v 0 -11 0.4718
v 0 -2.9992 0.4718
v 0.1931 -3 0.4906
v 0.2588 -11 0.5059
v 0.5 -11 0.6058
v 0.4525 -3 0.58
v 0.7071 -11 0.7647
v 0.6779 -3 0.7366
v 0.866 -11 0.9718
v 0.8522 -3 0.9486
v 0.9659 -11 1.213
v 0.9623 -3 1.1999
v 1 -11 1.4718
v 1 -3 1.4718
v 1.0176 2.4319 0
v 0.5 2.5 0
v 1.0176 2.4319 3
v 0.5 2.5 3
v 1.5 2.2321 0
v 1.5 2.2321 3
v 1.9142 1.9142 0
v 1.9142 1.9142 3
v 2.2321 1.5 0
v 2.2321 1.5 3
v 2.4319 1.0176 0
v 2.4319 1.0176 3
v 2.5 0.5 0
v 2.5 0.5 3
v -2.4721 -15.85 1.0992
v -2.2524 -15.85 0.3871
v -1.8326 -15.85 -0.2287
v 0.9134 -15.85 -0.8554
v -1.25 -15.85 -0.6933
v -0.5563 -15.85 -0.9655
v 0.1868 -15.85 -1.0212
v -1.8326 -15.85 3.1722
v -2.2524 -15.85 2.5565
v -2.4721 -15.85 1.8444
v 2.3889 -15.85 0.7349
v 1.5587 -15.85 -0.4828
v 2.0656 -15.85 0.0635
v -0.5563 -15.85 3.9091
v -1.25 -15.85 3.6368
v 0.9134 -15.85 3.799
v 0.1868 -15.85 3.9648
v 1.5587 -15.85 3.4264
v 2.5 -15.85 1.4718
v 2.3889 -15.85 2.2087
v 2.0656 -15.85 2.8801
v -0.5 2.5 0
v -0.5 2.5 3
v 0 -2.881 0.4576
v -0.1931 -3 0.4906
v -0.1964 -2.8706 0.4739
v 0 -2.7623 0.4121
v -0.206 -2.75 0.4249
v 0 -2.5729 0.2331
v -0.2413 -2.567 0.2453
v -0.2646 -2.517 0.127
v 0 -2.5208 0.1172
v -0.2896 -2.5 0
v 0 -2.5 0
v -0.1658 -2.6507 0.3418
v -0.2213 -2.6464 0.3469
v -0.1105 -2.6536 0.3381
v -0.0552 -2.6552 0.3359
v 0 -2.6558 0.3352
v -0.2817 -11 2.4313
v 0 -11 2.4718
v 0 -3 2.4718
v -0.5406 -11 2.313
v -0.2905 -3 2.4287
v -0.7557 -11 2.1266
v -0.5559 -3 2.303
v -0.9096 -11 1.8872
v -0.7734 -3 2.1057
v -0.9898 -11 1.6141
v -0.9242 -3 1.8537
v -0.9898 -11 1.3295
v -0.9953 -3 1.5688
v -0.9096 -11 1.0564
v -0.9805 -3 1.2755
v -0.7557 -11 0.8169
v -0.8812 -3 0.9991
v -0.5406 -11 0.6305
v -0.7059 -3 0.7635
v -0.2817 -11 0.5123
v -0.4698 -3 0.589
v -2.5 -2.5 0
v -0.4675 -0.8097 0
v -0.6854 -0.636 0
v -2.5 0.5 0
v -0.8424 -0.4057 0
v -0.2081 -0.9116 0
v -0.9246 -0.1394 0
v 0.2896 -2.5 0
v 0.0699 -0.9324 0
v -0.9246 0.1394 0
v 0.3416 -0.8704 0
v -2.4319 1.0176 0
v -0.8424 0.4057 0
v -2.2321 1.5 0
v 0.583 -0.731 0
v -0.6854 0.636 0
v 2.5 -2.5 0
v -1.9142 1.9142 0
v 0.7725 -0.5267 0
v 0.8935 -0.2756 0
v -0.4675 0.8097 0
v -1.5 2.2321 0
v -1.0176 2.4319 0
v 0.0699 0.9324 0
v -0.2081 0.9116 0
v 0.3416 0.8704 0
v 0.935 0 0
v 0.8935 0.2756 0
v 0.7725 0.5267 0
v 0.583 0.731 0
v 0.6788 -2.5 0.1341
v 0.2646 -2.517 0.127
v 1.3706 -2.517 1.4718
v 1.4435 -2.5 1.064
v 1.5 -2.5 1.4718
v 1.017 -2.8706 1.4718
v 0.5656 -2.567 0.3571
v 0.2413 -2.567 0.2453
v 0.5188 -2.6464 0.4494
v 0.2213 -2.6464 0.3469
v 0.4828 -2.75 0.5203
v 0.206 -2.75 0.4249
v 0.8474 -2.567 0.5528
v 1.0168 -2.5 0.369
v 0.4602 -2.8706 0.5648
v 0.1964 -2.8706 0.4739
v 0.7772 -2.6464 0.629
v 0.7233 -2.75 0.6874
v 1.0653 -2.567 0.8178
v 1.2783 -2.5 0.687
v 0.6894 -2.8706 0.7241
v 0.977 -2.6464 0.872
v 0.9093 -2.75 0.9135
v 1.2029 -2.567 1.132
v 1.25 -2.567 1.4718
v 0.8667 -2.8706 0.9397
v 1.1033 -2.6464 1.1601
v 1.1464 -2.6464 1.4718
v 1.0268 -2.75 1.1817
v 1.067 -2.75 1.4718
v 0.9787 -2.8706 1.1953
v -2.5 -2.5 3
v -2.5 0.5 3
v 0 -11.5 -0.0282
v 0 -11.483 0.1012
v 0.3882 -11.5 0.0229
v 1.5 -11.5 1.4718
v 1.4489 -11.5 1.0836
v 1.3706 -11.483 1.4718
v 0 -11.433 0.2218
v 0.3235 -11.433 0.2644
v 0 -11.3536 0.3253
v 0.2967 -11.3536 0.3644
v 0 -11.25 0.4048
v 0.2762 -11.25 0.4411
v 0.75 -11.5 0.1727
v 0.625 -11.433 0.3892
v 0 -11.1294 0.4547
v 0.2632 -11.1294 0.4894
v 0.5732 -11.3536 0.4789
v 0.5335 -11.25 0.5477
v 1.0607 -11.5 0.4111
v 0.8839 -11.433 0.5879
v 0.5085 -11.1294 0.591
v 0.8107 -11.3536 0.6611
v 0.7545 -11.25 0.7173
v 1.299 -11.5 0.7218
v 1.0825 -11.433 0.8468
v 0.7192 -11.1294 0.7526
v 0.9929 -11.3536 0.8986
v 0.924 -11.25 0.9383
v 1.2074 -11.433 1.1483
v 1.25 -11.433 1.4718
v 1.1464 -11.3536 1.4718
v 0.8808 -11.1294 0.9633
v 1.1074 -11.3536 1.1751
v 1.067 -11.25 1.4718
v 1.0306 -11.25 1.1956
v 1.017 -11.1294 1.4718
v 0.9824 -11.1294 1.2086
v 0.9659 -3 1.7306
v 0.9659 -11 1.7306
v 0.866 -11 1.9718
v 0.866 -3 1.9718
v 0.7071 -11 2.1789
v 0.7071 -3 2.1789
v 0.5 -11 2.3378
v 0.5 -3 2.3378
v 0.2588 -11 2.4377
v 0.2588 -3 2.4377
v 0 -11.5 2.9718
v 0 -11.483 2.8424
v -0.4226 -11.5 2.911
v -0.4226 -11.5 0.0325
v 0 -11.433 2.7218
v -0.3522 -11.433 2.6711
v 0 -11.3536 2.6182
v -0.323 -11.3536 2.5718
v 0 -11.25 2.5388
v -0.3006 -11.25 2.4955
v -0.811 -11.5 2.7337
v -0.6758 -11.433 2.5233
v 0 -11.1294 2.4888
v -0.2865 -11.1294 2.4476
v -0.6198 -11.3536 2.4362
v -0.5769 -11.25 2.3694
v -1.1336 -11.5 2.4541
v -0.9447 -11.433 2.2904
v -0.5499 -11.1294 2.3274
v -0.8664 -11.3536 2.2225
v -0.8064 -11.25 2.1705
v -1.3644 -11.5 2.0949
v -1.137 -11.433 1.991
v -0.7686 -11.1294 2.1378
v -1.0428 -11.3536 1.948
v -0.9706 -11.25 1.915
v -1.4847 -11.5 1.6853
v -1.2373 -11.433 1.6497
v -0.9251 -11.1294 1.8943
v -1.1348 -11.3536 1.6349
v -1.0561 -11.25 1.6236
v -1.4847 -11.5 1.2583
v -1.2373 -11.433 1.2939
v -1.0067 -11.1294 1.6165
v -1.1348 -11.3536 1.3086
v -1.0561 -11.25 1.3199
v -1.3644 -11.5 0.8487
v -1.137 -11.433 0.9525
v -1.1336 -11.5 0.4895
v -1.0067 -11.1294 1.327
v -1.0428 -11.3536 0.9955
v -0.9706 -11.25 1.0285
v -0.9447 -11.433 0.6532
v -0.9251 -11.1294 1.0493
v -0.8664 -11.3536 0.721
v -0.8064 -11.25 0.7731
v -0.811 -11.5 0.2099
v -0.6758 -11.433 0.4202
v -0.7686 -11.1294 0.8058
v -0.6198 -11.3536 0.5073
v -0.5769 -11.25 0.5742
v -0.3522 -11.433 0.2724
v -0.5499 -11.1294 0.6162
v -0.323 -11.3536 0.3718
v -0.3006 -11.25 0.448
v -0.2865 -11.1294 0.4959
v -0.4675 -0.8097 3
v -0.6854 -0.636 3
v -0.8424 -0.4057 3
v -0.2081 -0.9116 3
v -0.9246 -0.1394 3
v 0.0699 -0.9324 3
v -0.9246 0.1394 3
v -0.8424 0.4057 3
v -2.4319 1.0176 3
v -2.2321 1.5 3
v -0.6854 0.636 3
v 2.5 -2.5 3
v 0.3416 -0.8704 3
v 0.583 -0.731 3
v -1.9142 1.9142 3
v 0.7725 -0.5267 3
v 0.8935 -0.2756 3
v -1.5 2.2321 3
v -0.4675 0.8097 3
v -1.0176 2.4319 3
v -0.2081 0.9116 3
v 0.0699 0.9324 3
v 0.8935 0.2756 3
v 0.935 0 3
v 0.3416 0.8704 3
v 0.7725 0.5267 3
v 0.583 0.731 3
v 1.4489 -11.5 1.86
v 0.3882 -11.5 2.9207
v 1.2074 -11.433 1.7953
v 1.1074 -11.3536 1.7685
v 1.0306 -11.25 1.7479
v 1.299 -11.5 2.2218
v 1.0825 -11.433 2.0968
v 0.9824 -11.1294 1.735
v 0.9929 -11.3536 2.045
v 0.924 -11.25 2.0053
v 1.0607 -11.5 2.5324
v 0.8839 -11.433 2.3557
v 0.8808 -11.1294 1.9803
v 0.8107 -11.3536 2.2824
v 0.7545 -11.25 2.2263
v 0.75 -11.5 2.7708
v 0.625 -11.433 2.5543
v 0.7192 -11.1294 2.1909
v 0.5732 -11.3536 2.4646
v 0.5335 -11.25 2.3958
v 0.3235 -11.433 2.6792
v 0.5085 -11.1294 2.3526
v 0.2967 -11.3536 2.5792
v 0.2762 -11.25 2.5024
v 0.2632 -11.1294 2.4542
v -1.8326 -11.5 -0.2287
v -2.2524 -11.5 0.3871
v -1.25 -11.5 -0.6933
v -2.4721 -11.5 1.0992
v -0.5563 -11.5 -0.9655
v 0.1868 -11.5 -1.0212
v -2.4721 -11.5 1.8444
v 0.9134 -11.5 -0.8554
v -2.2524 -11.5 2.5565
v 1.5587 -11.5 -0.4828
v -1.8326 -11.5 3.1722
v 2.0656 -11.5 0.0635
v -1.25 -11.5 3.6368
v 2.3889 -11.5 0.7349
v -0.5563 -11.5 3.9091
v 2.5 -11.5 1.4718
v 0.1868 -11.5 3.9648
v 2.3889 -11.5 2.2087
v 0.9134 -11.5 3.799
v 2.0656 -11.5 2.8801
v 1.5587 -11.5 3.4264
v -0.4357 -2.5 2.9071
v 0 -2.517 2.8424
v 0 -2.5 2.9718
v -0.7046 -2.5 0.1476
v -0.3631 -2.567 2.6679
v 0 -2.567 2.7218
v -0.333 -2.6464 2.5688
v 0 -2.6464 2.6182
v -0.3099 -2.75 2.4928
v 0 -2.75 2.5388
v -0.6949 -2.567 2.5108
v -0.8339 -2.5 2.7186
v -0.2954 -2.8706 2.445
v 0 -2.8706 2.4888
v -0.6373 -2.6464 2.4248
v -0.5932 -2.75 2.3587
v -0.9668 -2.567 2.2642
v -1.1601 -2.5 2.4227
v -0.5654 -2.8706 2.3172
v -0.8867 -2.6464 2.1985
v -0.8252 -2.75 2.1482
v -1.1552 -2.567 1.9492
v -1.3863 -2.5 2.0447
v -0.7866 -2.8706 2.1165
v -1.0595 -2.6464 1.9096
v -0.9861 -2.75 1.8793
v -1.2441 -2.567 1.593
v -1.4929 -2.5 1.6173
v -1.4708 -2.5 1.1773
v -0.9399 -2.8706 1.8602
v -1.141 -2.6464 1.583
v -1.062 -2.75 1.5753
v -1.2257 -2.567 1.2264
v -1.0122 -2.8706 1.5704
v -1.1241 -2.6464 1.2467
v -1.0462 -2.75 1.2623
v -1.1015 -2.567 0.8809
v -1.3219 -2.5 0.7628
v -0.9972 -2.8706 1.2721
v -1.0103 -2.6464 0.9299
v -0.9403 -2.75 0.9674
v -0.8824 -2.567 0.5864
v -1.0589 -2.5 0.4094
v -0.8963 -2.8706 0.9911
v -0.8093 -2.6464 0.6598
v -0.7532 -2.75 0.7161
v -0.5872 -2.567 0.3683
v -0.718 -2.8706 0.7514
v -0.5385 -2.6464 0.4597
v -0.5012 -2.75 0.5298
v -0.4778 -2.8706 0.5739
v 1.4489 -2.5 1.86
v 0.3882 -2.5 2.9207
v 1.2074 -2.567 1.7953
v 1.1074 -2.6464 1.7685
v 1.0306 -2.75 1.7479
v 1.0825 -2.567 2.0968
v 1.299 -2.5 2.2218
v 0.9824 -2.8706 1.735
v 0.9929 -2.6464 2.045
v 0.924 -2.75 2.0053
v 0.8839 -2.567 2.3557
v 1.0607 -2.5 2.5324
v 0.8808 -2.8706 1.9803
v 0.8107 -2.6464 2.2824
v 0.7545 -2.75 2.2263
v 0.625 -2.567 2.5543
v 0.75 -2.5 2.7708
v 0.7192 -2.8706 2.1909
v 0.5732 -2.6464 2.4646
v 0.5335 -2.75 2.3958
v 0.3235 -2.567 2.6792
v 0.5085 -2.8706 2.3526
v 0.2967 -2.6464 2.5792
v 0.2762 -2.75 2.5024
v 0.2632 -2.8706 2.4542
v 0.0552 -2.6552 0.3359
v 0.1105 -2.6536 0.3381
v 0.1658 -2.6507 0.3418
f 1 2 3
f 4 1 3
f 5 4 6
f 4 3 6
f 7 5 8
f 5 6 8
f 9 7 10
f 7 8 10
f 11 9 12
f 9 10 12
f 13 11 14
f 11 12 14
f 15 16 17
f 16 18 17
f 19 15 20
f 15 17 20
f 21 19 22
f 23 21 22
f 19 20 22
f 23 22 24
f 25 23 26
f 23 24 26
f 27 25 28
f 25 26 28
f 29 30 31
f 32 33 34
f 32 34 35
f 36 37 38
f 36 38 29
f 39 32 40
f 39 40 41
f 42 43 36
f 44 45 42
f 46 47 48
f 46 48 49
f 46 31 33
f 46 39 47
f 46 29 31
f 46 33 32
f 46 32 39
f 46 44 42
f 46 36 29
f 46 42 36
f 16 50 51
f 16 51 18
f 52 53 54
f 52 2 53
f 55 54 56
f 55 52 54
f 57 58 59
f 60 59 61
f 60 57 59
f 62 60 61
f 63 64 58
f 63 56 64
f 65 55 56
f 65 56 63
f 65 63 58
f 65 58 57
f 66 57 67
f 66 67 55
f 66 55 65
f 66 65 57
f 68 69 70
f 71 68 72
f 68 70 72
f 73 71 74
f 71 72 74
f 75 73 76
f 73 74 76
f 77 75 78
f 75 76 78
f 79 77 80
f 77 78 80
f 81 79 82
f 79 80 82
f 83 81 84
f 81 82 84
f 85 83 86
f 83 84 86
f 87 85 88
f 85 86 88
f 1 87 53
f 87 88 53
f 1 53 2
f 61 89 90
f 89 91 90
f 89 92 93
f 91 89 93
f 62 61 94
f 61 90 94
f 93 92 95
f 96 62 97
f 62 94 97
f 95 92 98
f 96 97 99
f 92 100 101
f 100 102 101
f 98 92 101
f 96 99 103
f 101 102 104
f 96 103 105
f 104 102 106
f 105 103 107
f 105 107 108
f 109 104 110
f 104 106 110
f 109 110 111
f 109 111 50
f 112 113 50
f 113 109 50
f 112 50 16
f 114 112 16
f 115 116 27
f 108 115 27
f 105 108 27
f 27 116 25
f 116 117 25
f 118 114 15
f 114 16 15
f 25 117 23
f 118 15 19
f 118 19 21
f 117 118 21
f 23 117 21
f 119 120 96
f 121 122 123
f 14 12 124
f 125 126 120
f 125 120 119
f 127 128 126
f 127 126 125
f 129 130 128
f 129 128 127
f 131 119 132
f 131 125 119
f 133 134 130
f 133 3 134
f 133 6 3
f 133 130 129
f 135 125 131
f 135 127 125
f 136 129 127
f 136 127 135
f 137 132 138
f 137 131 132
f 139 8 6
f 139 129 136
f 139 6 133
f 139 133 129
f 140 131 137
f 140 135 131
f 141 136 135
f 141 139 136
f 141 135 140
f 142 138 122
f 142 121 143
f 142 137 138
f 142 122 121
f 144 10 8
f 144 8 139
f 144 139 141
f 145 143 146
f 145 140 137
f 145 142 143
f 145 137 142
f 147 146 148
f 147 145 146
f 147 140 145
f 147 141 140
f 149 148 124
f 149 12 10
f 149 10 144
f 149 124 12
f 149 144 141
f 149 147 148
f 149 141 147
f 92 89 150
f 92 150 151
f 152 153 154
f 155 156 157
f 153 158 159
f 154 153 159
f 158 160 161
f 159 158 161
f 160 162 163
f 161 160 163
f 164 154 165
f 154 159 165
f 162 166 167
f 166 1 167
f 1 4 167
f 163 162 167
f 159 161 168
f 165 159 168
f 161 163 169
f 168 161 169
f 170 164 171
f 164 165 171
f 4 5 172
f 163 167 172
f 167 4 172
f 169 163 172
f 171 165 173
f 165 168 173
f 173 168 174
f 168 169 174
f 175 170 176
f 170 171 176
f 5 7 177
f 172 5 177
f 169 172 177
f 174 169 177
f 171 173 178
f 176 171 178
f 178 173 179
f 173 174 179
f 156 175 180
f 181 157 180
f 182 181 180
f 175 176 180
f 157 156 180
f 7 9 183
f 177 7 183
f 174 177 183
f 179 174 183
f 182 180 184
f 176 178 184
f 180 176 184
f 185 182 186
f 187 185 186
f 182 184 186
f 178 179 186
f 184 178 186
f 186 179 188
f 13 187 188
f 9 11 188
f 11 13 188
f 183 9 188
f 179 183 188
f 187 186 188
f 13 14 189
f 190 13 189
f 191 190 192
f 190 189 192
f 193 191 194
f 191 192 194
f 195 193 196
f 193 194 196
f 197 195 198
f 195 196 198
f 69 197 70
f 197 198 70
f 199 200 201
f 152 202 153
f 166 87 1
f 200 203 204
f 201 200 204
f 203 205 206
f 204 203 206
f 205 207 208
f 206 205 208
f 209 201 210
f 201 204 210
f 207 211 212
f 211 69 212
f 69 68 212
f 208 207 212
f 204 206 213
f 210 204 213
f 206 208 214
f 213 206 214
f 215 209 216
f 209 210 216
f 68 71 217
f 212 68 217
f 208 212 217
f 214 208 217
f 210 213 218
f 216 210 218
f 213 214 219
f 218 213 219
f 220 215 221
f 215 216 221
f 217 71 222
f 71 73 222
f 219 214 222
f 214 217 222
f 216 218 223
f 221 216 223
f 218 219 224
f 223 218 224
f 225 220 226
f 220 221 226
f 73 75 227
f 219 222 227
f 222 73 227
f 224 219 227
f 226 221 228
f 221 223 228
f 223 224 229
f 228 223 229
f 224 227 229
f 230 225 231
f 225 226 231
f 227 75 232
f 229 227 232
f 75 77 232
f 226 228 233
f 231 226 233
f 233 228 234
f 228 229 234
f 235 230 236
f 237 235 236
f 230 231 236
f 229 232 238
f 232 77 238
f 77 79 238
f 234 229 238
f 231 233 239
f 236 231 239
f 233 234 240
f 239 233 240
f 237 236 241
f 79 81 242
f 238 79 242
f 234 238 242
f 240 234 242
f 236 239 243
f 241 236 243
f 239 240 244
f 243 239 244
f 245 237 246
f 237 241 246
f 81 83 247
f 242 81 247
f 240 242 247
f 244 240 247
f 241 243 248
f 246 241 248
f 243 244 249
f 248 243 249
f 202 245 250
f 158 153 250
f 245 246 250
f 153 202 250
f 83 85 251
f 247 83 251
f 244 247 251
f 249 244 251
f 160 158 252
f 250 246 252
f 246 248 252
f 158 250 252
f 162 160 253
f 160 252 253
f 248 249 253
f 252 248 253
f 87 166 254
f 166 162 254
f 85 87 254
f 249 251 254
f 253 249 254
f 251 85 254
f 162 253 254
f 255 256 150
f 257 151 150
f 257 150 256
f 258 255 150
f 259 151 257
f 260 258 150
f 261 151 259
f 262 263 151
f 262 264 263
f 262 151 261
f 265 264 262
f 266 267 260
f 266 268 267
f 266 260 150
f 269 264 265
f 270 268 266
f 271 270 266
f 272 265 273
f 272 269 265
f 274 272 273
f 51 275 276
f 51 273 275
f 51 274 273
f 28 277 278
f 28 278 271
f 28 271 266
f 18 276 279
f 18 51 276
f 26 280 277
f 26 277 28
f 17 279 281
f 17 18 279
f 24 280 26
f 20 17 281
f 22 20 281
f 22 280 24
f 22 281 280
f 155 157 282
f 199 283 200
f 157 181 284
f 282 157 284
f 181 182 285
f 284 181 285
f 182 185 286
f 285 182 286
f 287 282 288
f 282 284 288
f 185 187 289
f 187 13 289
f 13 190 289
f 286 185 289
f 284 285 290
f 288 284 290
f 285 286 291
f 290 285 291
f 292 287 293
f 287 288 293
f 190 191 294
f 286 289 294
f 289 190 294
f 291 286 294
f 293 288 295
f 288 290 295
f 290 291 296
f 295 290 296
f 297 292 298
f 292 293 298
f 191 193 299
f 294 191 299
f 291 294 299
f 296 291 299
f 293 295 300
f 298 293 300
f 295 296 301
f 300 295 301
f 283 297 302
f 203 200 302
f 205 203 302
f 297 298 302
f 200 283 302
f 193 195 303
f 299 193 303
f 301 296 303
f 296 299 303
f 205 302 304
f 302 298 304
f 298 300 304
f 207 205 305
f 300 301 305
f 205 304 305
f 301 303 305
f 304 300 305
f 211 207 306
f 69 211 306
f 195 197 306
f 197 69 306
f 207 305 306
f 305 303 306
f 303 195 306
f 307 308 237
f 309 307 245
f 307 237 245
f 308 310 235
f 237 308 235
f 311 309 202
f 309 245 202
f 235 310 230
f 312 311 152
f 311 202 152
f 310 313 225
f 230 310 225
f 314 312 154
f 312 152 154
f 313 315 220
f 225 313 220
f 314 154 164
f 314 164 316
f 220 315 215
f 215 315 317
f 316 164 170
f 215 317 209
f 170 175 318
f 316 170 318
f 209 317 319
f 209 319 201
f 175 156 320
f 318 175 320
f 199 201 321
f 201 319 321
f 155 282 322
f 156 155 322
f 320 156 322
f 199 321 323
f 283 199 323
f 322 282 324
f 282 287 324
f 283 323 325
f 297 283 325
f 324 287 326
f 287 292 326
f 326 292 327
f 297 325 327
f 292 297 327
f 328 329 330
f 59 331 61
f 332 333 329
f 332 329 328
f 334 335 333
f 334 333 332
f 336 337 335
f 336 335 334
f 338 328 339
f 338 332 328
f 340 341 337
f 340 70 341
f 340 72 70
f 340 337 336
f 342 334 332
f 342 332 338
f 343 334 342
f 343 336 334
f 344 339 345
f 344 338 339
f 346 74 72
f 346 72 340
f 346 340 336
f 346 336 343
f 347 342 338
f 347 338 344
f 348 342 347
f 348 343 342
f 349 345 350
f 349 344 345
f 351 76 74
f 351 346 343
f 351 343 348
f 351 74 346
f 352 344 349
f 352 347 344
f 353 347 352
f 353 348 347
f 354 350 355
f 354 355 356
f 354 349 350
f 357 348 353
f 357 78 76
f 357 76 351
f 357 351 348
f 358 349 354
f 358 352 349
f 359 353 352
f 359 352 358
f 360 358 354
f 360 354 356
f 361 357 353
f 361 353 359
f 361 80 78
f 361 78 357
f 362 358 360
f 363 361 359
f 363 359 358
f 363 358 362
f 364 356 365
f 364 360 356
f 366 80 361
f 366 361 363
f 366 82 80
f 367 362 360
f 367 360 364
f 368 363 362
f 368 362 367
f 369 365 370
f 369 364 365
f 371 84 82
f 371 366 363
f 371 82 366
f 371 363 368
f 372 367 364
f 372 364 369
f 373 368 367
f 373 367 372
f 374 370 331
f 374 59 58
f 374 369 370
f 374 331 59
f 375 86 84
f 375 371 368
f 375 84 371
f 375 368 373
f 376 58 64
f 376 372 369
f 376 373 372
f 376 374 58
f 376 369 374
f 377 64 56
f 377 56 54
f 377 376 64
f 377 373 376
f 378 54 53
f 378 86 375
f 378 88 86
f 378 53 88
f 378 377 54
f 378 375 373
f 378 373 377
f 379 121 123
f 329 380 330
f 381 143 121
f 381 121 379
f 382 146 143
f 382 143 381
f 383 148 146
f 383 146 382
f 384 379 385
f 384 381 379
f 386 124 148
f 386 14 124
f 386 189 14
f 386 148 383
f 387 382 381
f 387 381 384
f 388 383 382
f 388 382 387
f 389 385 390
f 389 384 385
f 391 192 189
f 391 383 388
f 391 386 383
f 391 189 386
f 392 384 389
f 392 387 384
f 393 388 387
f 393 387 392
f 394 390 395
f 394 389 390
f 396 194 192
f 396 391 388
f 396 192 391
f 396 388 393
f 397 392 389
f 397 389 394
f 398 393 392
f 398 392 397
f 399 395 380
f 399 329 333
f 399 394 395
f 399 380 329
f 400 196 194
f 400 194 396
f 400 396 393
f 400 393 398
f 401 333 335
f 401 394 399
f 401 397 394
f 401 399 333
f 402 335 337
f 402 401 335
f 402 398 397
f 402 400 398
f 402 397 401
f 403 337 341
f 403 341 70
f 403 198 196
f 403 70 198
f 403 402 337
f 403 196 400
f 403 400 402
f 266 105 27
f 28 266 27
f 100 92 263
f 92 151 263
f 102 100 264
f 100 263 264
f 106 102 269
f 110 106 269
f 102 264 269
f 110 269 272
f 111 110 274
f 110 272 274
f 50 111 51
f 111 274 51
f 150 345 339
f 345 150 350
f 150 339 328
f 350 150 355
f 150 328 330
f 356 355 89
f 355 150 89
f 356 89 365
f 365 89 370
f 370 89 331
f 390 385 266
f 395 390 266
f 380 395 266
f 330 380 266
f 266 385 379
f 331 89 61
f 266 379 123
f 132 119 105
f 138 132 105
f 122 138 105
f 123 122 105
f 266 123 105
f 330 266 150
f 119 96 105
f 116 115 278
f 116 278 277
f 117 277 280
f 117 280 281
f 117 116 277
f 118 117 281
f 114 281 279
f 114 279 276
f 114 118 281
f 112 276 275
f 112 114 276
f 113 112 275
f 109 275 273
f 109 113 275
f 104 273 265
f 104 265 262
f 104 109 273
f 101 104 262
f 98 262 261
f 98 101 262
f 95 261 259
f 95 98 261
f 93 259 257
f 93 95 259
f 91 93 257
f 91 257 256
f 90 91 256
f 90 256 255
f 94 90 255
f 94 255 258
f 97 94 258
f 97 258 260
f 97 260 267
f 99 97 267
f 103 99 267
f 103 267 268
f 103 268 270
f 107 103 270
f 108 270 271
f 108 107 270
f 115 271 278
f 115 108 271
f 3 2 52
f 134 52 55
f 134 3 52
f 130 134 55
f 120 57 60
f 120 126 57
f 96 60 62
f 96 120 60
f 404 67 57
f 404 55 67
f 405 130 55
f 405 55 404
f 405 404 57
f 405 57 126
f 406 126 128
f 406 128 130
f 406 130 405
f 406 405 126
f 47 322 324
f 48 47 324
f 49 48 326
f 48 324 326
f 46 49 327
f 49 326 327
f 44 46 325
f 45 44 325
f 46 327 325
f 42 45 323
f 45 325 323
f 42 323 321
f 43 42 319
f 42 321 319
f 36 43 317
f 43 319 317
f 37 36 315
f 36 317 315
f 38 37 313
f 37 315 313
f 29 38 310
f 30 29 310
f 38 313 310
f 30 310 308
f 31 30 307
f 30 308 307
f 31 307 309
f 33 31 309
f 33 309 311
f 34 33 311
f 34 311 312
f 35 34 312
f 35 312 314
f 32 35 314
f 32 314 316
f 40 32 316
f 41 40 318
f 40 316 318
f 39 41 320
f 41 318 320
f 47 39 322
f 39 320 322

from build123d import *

# Parameters (mm, degrees)
SKETCH1_W           = 5
SKETCH1_H           = 5
SKETCH1_R           = 0.935
BOSS_EXTRUDE3_DEPTH = 3
FILLET3_R           = 2
BOSS_EXTRUDE4_DEPTH = 9
FILLET5_R           = 0.5
SKETCH6_R           = 2.5
BOSS_EXTRUDE5_DEPTH = 4.35
FILLET6_R           = 0.5


with BuildPart() as part:
    # Sketch1 → Boss-Extrude3 (new body)
    with BuildSketch(Plane.XY):
        Rectangle(SKETCH1_W, SKETCH1_H)
        Circle(SKETCH1_R, mode=Mode.SUBTRACT)
    extrude(amount=BOSS_EXTRUDE3_DEPTH)

    # Fillet3
    fillet3_edges = [part.edges().sort_by_distance(p)[0] for p in [
        (-2.5, 2.5, 1.5),
        (2.5, 2.5, 1.5),
    ]]
    fillet(fillet3_edges, radius=FILLET3_R)

    # Sketch3 → Boss-Extrude4 (add)
    with BuildSketch(Plane.XZ.offset(2.5)):
        with BuildLine():
            ThreePointArc((0, 2.471779521), (-1, 1.471779521), (0, 0.471779521))
            Line((0, 0.471779521), (0, 2.471779521))
        make_face()
        with BuildLine():
            Line((0, 2.471779521), (0, 0.471779521))
            ThreePointArc((0, 0.471779521), (0.707106781, 0.76467274), (1, 1.471779521))
            ThreePointArc((1, 1.471779521), (0.707106781, 2.178886302), (0, 2.471779521))
        make_face()
    extrude(amount=BOSS_EXTRUDE4_DEPTH)

    # Fillet5
    fillet5_edges = [part.edges().sort_by_distance(p)[0] for p in [
        (0, -2.5, 0.471779521),
    ]]
    fillet(fillet5_edges, radius=FILLET5_R)

    # Sketch6 → Boss-Extrude5 (add)
    with BuildSketch(Plane.XZ.offset(11.5)):
        with Locations((0, 1.471779521)):
            Circle(SKETCH6_R)
    extrude(amount=BOSS_EXTRUDE5_DEPTH)

    # Fillet6
    fillet6_edges = [part.edges().sort_by_distance(p)[0] for p in [
        (0, -11.5, 0.471779521),
    ]]
    fillet(fillet6_edges, radius=FILLET6_R)


solid = part.part
